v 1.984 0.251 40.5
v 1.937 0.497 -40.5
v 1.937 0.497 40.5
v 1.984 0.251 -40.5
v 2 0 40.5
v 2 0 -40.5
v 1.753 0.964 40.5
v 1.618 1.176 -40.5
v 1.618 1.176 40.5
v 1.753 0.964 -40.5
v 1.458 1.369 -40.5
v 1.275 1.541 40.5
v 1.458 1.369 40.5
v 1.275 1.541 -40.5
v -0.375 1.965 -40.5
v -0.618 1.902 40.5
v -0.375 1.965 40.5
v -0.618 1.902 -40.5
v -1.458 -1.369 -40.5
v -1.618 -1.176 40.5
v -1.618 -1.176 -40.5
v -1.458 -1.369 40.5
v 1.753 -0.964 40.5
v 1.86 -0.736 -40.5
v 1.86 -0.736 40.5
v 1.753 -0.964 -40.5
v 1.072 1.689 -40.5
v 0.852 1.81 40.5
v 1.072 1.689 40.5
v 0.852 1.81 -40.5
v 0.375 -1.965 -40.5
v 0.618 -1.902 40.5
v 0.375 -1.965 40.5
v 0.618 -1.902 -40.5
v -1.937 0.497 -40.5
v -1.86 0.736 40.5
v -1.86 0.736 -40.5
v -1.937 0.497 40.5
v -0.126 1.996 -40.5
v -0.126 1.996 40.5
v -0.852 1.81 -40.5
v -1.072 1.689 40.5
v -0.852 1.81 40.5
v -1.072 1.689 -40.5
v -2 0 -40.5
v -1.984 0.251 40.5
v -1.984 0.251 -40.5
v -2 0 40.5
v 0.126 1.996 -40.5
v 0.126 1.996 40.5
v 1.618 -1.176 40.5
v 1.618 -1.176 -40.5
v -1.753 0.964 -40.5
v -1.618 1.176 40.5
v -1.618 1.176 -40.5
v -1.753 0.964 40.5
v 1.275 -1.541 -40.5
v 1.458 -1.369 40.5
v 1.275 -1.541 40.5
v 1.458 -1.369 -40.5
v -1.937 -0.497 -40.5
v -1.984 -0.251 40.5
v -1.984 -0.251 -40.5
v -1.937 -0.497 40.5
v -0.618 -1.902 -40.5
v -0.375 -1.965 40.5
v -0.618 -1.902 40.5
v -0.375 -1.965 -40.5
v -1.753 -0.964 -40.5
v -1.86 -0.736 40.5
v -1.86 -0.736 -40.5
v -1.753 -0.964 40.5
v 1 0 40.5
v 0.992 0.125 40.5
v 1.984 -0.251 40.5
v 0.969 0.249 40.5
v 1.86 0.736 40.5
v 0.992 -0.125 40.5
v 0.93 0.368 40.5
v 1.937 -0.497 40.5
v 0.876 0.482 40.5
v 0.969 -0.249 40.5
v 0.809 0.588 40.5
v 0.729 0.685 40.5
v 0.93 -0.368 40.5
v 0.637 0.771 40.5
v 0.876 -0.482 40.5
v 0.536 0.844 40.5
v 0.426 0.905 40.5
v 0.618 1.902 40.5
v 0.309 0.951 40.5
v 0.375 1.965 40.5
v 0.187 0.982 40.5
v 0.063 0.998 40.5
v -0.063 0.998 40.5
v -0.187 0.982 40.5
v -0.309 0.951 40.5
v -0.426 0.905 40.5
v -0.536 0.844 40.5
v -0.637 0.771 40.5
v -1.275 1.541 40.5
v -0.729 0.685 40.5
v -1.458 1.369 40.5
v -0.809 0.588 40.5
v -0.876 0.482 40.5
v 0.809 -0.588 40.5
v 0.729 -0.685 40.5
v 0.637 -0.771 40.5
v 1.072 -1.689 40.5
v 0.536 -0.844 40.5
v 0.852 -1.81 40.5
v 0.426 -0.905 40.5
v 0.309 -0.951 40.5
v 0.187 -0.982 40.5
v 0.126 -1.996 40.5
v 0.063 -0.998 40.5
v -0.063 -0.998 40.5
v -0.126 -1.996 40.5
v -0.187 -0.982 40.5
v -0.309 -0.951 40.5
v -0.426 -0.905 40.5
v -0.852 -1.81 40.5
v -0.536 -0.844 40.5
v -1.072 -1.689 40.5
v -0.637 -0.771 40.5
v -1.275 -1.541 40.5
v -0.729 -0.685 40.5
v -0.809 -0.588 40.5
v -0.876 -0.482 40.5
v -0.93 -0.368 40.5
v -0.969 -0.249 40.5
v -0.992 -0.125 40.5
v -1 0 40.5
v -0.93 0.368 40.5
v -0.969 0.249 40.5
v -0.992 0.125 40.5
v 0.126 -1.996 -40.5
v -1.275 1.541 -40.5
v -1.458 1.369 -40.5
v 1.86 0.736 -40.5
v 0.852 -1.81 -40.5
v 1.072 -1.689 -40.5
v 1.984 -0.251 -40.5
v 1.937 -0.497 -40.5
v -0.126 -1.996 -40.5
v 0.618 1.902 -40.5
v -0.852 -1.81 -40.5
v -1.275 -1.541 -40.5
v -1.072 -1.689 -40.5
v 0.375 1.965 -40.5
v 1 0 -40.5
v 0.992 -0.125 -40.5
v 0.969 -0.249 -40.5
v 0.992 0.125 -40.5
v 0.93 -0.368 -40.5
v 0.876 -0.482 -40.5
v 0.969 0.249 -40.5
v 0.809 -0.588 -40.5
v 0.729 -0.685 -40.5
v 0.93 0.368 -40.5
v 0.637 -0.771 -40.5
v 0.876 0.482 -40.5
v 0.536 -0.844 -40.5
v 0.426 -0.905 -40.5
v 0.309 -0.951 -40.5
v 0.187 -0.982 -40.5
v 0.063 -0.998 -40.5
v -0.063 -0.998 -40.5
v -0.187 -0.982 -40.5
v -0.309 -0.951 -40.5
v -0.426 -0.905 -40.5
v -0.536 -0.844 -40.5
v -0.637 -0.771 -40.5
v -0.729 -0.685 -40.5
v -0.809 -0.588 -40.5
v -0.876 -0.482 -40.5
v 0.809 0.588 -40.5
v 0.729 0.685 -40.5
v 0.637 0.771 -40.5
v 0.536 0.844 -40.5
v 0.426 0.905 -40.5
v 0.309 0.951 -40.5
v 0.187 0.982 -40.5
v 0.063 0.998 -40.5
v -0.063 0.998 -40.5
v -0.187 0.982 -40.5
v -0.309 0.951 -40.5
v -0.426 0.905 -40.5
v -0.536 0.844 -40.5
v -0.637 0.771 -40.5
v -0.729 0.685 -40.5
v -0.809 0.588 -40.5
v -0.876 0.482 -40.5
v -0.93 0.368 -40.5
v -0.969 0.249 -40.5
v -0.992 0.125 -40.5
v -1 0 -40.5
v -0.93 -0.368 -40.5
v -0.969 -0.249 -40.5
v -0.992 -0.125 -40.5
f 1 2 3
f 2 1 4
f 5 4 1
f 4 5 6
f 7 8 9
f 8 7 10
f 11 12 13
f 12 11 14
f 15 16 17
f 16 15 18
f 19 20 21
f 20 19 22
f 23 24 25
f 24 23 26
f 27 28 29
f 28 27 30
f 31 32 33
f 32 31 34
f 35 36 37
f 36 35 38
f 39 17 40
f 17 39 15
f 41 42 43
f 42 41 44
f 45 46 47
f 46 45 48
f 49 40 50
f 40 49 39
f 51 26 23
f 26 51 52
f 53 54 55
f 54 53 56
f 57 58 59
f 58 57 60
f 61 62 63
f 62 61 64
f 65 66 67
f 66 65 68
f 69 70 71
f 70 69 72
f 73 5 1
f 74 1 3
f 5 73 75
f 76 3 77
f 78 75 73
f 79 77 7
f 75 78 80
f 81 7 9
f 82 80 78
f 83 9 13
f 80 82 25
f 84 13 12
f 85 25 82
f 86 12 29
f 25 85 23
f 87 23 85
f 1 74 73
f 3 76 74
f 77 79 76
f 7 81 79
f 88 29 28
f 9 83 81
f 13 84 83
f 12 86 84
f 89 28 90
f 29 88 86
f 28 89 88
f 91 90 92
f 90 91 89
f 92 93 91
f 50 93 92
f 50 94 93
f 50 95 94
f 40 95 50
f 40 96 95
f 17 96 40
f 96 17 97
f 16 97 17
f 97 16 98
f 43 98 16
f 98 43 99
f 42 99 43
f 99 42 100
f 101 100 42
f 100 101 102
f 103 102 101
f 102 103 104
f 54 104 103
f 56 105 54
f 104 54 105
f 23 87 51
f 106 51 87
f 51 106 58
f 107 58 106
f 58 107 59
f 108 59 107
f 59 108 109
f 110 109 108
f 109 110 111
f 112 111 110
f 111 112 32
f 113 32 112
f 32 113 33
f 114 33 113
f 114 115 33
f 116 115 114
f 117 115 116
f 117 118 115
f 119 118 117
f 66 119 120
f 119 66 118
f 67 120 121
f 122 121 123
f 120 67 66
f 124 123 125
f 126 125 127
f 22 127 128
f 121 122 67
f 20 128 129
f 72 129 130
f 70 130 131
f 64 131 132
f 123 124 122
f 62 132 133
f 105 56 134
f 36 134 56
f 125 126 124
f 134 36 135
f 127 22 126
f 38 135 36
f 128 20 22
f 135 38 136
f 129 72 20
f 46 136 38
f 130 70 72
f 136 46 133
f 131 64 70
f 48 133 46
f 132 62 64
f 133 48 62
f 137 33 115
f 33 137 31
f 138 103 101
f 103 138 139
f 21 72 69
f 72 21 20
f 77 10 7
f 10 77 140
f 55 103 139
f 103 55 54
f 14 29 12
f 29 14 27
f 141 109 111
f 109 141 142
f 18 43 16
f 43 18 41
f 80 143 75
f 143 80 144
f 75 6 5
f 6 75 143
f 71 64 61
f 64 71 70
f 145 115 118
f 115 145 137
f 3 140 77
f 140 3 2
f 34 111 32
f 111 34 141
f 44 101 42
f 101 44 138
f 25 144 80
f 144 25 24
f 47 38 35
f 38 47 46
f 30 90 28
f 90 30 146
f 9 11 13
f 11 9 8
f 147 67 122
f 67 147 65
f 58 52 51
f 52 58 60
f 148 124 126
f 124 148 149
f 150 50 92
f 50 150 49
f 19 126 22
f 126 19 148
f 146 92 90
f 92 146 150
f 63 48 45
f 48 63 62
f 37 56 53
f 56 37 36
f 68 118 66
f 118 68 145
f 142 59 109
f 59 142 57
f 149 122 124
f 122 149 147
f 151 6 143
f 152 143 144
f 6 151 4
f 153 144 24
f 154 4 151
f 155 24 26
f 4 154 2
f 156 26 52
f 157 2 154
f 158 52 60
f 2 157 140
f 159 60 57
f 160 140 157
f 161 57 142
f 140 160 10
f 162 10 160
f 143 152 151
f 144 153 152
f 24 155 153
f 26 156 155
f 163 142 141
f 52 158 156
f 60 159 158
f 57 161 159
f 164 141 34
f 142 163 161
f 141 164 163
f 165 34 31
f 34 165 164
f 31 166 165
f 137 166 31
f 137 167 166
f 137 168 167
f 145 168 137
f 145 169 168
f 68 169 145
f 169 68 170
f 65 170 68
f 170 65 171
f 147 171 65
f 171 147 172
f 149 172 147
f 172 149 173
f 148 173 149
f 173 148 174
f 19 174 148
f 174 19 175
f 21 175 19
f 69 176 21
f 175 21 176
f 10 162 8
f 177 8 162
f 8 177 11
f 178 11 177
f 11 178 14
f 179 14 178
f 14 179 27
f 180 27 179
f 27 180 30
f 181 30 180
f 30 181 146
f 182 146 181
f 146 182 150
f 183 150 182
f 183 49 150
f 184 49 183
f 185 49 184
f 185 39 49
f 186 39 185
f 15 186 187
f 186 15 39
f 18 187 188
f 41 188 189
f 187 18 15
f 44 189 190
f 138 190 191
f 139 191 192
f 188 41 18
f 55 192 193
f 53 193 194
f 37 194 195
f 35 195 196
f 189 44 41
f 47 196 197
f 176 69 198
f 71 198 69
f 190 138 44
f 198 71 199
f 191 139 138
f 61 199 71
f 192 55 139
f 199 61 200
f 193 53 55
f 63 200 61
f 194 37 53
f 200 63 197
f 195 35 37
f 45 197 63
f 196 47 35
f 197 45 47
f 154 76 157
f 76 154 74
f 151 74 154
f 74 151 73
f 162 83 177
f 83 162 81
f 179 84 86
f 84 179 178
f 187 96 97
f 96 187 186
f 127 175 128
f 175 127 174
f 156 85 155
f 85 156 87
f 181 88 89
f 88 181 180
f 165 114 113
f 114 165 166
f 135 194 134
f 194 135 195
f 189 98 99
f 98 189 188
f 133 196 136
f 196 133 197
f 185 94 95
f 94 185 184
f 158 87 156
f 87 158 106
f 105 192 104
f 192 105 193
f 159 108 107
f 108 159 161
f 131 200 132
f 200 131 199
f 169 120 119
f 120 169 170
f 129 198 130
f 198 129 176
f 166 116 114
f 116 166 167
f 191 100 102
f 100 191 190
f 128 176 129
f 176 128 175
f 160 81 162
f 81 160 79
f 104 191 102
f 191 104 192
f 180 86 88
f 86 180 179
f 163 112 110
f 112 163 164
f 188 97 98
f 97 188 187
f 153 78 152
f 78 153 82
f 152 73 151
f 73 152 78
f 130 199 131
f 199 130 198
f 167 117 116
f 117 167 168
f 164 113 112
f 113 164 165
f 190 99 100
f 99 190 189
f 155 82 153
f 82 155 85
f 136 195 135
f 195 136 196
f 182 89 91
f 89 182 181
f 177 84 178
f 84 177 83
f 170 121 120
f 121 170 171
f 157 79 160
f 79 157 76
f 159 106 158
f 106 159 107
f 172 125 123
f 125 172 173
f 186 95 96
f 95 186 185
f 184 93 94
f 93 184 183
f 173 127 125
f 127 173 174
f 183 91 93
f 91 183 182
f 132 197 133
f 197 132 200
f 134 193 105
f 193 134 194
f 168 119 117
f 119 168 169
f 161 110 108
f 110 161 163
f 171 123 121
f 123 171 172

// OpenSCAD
$fn = 50;


difference() {
	union() {
		translate(v = [0, 0, -40.5000000000]) {
			cylinder(h = 81, r = 2.0000000000);
		}
	}
	union() {
		translate(v = [0, 0, -100.0000000000]) {
			cylinder(h = 200, r = 1.0000000000);
		}
	}
}
